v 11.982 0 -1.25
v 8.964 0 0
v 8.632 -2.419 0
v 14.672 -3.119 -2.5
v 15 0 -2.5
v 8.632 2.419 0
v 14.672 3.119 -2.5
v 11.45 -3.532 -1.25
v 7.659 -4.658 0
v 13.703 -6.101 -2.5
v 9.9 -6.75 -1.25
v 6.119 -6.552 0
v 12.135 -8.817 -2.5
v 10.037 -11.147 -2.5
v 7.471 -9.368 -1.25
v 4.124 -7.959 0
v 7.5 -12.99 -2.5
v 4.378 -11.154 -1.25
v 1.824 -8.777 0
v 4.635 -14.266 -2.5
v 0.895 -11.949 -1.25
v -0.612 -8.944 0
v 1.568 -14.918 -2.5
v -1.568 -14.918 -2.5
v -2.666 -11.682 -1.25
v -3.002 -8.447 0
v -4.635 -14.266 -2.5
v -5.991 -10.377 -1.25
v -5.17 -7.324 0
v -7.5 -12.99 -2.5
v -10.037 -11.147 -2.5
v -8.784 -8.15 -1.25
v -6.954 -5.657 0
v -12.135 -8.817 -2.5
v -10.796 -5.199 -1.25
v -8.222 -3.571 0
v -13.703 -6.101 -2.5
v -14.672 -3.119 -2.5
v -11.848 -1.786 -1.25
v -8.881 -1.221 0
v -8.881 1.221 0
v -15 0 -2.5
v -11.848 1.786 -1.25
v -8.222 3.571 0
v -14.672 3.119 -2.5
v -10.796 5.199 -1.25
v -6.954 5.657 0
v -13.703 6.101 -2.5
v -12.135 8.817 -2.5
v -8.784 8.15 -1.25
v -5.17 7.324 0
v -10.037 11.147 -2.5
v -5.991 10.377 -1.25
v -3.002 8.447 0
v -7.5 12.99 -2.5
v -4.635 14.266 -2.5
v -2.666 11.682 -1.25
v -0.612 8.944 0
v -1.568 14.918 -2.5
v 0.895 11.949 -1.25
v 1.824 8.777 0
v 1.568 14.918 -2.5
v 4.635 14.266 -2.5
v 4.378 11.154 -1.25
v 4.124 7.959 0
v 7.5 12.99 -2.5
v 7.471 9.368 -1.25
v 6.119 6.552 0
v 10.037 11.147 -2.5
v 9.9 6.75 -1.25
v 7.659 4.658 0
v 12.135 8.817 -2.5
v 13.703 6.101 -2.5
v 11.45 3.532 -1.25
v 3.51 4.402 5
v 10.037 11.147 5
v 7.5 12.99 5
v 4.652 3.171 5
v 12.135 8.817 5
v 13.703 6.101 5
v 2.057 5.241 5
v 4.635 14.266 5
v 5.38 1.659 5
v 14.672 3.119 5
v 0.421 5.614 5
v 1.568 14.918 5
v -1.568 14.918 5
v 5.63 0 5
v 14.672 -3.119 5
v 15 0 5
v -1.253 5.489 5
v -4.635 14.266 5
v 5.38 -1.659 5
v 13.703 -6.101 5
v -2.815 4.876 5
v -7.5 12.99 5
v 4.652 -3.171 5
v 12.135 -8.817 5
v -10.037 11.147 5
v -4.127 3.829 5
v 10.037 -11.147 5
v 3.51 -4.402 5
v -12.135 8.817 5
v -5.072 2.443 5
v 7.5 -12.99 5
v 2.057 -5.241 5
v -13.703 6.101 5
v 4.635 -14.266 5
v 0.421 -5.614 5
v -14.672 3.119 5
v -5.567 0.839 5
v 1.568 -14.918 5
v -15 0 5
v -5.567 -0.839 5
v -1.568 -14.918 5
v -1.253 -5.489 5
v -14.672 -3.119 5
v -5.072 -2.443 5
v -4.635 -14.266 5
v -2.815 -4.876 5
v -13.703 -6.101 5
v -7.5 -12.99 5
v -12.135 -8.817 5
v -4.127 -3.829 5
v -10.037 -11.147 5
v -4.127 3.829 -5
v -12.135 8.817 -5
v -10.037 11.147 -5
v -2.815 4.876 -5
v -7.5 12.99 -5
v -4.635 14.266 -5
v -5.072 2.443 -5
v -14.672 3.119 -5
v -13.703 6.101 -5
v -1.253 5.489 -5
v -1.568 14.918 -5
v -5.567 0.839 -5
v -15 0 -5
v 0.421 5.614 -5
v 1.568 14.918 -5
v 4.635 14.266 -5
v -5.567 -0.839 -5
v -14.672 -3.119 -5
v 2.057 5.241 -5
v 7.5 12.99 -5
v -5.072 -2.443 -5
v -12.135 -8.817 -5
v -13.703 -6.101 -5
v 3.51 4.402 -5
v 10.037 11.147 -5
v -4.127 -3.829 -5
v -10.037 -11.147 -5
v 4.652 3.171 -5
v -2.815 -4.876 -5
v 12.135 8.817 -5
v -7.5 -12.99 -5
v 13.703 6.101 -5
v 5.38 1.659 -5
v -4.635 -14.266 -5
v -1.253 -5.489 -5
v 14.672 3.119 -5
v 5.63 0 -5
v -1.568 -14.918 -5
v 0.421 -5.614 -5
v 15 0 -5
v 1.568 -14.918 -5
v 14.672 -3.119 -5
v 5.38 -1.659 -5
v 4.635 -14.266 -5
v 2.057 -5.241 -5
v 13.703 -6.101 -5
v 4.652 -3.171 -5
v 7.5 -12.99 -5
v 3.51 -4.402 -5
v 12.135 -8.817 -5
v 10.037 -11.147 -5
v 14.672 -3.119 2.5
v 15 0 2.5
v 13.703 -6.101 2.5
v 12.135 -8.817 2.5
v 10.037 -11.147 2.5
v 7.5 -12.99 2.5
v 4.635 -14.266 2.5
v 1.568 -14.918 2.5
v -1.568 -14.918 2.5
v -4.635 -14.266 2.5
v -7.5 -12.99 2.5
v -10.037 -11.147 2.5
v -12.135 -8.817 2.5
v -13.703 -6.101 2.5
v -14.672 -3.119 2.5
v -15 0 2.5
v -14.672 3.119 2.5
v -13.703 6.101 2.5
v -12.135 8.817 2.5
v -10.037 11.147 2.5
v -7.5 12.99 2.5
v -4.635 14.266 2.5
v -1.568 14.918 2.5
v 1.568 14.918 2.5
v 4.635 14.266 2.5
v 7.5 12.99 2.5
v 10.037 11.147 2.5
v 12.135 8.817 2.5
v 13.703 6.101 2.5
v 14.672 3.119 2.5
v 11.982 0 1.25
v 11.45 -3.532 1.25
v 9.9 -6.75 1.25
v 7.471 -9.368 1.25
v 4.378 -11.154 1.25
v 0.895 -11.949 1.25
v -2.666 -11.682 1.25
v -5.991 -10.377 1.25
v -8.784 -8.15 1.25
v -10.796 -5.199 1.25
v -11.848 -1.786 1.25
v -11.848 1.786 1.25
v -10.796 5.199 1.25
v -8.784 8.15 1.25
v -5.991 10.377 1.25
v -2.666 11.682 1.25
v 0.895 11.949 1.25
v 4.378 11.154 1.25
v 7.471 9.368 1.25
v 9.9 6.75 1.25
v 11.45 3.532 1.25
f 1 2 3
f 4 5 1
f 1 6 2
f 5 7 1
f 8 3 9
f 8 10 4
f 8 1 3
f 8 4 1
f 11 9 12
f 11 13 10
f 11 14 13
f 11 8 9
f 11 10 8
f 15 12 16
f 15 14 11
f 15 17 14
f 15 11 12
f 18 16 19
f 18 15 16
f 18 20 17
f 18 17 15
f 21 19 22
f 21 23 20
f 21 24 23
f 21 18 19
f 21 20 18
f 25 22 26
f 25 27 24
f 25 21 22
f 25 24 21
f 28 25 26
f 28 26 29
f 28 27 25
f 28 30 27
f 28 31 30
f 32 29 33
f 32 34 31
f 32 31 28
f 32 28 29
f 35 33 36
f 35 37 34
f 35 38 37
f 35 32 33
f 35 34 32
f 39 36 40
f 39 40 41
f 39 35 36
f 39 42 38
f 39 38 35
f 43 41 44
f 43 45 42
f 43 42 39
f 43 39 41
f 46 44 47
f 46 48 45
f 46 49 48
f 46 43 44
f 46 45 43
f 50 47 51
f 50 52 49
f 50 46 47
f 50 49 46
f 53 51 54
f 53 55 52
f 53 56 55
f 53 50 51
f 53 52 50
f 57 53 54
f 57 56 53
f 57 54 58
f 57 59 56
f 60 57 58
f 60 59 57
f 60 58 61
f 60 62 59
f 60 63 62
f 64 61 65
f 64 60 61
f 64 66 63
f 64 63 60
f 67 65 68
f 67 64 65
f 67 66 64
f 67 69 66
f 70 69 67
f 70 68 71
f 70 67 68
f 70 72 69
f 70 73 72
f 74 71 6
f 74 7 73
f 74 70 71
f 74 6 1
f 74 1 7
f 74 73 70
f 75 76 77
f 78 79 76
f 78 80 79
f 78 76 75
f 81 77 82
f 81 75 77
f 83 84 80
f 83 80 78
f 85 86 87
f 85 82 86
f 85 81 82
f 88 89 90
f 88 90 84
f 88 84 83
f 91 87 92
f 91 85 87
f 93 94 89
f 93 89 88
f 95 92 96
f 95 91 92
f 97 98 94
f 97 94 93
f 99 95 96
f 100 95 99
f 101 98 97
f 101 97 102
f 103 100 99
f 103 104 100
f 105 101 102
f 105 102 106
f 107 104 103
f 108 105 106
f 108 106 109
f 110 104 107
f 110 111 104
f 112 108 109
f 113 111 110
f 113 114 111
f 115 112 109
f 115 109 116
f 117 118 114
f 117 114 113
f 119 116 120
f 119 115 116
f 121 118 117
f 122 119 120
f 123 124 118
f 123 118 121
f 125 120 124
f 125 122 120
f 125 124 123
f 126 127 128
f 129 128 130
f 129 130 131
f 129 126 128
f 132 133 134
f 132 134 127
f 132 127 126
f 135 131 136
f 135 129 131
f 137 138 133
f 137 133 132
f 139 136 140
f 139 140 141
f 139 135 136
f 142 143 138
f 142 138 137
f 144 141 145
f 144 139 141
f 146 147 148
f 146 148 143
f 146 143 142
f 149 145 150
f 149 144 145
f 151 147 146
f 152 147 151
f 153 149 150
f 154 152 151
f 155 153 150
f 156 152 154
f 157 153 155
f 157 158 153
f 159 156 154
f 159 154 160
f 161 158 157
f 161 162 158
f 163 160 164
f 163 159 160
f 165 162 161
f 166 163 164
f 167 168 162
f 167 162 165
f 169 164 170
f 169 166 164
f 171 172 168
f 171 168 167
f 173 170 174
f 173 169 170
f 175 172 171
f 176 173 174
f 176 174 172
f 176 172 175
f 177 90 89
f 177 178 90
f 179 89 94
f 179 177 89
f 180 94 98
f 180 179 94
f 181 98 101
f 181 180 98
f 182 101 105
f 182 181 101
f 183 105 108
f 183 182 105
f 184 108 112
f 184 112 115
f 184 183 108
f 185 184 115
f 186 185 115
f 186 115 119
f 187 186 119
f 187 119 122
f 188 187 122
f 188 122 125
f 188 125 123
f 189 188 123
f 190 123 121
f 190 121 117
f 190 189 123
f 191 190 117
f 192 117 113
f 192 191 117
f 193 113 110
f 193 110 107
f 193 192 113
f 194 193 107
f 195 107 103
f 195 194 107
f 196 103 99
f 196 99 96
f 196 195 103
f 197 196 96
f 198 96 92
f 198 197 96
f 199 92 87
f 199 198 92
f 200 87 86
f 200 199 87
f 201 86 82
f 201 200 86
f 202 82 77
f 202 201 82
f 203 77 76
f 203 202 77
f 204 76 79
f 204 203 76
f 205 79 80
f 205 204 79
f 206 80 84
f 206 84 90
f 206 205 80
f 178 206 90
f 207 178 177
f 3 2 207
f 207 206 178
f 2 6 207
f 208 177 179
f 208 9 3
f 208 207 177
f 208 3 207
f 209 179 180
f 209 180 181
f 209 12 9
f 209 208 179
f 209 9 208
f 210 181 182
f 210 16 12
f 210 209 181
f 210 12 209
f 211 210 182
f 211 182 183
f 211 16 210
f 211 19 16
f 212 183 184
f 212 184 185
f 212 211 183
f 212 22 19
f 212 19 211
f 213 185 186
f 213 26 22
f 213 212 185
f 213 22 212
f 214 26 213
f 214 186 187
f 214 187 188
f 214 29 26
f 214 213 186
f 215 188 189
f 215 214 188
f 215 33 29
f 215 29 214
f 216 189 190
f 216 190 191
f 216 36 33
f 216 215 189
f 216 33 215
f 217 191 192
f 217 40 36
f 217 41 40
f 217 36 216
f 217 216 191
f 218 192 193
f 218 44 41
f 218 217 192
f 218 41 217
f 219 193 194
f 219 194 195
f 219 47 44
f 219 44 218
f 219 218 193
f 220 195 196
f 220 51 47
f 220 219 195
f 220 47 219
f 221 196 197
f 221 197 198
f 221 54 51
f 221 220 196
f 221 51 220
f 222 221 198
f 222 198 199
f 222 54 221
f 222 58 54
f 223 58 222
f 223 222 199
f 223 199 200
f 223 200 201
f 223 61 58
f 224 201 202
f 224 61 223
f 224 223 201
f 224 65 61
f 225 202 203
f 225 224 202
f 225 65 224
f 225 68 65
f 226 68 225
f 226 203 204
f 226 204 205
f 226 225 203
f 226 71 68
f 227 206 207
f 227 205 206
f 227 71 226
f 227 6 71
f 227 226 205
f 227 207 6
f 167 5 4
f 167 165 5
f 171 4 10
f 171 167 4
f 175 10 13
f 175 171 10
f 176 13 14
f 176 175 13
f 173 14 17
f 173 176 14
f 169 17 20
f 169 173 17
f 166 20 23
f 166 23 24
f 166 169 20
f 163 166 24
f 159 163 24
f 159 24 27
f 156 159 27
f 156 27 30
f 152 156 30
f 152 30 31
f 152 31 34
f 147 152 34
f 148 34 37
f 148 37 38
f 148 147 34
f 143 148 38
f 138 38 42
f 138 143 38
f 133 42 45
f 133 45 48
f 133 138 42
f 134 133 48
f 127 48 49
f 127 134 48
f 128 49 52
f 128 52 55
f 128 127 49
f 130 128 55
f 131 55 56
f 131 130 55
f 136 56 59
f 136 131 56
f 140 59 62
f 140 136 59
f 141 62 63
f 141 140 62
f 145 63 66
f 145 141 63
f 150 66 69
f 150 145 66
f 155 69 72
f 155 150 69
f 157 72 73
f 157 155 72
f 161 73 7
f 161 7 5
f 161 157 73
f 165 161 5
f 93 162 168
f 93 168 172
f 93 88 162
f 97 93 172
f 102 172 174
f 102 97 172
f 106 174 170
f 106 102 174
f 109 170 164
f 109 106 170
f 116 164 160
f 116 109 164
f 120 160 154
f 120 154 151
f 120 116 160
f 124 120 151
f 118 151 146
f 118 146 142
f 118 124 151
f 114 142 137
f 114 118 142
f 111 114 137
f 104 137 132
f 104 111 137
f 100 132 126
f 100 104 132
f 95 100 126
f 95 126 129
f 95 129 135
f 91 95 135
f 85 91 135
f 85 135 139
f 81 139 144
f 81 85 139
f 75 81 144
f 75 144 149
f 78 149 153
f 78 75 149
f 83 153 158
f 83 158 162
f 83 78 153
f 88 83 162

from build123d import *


with BuildPart() as part:
    # Çizim1 → Döndür1 (revolve)
    with BuildSketch(Plane(origin=(0, 0, 0), x_dir=(0, 0, -1), z_dir=(1, 0, 0)), mode=Mode.PRIVATE) as d_nd_r1_sk:
        Polygon((-2.5, 15), (0, 8.964466094), (2.5, 15), (5, 15), (5, 5.63), (-5, 5.63), (-5, 15), align=None)
    revolve(d_nd_r1_sk.sketch.rotate(Axis((0, 0, 13.198807947), (0, 0, -1)), 90), axis=Axis((0, 0, 13.198807947), (0, 0, -1)))


solid = part.part
